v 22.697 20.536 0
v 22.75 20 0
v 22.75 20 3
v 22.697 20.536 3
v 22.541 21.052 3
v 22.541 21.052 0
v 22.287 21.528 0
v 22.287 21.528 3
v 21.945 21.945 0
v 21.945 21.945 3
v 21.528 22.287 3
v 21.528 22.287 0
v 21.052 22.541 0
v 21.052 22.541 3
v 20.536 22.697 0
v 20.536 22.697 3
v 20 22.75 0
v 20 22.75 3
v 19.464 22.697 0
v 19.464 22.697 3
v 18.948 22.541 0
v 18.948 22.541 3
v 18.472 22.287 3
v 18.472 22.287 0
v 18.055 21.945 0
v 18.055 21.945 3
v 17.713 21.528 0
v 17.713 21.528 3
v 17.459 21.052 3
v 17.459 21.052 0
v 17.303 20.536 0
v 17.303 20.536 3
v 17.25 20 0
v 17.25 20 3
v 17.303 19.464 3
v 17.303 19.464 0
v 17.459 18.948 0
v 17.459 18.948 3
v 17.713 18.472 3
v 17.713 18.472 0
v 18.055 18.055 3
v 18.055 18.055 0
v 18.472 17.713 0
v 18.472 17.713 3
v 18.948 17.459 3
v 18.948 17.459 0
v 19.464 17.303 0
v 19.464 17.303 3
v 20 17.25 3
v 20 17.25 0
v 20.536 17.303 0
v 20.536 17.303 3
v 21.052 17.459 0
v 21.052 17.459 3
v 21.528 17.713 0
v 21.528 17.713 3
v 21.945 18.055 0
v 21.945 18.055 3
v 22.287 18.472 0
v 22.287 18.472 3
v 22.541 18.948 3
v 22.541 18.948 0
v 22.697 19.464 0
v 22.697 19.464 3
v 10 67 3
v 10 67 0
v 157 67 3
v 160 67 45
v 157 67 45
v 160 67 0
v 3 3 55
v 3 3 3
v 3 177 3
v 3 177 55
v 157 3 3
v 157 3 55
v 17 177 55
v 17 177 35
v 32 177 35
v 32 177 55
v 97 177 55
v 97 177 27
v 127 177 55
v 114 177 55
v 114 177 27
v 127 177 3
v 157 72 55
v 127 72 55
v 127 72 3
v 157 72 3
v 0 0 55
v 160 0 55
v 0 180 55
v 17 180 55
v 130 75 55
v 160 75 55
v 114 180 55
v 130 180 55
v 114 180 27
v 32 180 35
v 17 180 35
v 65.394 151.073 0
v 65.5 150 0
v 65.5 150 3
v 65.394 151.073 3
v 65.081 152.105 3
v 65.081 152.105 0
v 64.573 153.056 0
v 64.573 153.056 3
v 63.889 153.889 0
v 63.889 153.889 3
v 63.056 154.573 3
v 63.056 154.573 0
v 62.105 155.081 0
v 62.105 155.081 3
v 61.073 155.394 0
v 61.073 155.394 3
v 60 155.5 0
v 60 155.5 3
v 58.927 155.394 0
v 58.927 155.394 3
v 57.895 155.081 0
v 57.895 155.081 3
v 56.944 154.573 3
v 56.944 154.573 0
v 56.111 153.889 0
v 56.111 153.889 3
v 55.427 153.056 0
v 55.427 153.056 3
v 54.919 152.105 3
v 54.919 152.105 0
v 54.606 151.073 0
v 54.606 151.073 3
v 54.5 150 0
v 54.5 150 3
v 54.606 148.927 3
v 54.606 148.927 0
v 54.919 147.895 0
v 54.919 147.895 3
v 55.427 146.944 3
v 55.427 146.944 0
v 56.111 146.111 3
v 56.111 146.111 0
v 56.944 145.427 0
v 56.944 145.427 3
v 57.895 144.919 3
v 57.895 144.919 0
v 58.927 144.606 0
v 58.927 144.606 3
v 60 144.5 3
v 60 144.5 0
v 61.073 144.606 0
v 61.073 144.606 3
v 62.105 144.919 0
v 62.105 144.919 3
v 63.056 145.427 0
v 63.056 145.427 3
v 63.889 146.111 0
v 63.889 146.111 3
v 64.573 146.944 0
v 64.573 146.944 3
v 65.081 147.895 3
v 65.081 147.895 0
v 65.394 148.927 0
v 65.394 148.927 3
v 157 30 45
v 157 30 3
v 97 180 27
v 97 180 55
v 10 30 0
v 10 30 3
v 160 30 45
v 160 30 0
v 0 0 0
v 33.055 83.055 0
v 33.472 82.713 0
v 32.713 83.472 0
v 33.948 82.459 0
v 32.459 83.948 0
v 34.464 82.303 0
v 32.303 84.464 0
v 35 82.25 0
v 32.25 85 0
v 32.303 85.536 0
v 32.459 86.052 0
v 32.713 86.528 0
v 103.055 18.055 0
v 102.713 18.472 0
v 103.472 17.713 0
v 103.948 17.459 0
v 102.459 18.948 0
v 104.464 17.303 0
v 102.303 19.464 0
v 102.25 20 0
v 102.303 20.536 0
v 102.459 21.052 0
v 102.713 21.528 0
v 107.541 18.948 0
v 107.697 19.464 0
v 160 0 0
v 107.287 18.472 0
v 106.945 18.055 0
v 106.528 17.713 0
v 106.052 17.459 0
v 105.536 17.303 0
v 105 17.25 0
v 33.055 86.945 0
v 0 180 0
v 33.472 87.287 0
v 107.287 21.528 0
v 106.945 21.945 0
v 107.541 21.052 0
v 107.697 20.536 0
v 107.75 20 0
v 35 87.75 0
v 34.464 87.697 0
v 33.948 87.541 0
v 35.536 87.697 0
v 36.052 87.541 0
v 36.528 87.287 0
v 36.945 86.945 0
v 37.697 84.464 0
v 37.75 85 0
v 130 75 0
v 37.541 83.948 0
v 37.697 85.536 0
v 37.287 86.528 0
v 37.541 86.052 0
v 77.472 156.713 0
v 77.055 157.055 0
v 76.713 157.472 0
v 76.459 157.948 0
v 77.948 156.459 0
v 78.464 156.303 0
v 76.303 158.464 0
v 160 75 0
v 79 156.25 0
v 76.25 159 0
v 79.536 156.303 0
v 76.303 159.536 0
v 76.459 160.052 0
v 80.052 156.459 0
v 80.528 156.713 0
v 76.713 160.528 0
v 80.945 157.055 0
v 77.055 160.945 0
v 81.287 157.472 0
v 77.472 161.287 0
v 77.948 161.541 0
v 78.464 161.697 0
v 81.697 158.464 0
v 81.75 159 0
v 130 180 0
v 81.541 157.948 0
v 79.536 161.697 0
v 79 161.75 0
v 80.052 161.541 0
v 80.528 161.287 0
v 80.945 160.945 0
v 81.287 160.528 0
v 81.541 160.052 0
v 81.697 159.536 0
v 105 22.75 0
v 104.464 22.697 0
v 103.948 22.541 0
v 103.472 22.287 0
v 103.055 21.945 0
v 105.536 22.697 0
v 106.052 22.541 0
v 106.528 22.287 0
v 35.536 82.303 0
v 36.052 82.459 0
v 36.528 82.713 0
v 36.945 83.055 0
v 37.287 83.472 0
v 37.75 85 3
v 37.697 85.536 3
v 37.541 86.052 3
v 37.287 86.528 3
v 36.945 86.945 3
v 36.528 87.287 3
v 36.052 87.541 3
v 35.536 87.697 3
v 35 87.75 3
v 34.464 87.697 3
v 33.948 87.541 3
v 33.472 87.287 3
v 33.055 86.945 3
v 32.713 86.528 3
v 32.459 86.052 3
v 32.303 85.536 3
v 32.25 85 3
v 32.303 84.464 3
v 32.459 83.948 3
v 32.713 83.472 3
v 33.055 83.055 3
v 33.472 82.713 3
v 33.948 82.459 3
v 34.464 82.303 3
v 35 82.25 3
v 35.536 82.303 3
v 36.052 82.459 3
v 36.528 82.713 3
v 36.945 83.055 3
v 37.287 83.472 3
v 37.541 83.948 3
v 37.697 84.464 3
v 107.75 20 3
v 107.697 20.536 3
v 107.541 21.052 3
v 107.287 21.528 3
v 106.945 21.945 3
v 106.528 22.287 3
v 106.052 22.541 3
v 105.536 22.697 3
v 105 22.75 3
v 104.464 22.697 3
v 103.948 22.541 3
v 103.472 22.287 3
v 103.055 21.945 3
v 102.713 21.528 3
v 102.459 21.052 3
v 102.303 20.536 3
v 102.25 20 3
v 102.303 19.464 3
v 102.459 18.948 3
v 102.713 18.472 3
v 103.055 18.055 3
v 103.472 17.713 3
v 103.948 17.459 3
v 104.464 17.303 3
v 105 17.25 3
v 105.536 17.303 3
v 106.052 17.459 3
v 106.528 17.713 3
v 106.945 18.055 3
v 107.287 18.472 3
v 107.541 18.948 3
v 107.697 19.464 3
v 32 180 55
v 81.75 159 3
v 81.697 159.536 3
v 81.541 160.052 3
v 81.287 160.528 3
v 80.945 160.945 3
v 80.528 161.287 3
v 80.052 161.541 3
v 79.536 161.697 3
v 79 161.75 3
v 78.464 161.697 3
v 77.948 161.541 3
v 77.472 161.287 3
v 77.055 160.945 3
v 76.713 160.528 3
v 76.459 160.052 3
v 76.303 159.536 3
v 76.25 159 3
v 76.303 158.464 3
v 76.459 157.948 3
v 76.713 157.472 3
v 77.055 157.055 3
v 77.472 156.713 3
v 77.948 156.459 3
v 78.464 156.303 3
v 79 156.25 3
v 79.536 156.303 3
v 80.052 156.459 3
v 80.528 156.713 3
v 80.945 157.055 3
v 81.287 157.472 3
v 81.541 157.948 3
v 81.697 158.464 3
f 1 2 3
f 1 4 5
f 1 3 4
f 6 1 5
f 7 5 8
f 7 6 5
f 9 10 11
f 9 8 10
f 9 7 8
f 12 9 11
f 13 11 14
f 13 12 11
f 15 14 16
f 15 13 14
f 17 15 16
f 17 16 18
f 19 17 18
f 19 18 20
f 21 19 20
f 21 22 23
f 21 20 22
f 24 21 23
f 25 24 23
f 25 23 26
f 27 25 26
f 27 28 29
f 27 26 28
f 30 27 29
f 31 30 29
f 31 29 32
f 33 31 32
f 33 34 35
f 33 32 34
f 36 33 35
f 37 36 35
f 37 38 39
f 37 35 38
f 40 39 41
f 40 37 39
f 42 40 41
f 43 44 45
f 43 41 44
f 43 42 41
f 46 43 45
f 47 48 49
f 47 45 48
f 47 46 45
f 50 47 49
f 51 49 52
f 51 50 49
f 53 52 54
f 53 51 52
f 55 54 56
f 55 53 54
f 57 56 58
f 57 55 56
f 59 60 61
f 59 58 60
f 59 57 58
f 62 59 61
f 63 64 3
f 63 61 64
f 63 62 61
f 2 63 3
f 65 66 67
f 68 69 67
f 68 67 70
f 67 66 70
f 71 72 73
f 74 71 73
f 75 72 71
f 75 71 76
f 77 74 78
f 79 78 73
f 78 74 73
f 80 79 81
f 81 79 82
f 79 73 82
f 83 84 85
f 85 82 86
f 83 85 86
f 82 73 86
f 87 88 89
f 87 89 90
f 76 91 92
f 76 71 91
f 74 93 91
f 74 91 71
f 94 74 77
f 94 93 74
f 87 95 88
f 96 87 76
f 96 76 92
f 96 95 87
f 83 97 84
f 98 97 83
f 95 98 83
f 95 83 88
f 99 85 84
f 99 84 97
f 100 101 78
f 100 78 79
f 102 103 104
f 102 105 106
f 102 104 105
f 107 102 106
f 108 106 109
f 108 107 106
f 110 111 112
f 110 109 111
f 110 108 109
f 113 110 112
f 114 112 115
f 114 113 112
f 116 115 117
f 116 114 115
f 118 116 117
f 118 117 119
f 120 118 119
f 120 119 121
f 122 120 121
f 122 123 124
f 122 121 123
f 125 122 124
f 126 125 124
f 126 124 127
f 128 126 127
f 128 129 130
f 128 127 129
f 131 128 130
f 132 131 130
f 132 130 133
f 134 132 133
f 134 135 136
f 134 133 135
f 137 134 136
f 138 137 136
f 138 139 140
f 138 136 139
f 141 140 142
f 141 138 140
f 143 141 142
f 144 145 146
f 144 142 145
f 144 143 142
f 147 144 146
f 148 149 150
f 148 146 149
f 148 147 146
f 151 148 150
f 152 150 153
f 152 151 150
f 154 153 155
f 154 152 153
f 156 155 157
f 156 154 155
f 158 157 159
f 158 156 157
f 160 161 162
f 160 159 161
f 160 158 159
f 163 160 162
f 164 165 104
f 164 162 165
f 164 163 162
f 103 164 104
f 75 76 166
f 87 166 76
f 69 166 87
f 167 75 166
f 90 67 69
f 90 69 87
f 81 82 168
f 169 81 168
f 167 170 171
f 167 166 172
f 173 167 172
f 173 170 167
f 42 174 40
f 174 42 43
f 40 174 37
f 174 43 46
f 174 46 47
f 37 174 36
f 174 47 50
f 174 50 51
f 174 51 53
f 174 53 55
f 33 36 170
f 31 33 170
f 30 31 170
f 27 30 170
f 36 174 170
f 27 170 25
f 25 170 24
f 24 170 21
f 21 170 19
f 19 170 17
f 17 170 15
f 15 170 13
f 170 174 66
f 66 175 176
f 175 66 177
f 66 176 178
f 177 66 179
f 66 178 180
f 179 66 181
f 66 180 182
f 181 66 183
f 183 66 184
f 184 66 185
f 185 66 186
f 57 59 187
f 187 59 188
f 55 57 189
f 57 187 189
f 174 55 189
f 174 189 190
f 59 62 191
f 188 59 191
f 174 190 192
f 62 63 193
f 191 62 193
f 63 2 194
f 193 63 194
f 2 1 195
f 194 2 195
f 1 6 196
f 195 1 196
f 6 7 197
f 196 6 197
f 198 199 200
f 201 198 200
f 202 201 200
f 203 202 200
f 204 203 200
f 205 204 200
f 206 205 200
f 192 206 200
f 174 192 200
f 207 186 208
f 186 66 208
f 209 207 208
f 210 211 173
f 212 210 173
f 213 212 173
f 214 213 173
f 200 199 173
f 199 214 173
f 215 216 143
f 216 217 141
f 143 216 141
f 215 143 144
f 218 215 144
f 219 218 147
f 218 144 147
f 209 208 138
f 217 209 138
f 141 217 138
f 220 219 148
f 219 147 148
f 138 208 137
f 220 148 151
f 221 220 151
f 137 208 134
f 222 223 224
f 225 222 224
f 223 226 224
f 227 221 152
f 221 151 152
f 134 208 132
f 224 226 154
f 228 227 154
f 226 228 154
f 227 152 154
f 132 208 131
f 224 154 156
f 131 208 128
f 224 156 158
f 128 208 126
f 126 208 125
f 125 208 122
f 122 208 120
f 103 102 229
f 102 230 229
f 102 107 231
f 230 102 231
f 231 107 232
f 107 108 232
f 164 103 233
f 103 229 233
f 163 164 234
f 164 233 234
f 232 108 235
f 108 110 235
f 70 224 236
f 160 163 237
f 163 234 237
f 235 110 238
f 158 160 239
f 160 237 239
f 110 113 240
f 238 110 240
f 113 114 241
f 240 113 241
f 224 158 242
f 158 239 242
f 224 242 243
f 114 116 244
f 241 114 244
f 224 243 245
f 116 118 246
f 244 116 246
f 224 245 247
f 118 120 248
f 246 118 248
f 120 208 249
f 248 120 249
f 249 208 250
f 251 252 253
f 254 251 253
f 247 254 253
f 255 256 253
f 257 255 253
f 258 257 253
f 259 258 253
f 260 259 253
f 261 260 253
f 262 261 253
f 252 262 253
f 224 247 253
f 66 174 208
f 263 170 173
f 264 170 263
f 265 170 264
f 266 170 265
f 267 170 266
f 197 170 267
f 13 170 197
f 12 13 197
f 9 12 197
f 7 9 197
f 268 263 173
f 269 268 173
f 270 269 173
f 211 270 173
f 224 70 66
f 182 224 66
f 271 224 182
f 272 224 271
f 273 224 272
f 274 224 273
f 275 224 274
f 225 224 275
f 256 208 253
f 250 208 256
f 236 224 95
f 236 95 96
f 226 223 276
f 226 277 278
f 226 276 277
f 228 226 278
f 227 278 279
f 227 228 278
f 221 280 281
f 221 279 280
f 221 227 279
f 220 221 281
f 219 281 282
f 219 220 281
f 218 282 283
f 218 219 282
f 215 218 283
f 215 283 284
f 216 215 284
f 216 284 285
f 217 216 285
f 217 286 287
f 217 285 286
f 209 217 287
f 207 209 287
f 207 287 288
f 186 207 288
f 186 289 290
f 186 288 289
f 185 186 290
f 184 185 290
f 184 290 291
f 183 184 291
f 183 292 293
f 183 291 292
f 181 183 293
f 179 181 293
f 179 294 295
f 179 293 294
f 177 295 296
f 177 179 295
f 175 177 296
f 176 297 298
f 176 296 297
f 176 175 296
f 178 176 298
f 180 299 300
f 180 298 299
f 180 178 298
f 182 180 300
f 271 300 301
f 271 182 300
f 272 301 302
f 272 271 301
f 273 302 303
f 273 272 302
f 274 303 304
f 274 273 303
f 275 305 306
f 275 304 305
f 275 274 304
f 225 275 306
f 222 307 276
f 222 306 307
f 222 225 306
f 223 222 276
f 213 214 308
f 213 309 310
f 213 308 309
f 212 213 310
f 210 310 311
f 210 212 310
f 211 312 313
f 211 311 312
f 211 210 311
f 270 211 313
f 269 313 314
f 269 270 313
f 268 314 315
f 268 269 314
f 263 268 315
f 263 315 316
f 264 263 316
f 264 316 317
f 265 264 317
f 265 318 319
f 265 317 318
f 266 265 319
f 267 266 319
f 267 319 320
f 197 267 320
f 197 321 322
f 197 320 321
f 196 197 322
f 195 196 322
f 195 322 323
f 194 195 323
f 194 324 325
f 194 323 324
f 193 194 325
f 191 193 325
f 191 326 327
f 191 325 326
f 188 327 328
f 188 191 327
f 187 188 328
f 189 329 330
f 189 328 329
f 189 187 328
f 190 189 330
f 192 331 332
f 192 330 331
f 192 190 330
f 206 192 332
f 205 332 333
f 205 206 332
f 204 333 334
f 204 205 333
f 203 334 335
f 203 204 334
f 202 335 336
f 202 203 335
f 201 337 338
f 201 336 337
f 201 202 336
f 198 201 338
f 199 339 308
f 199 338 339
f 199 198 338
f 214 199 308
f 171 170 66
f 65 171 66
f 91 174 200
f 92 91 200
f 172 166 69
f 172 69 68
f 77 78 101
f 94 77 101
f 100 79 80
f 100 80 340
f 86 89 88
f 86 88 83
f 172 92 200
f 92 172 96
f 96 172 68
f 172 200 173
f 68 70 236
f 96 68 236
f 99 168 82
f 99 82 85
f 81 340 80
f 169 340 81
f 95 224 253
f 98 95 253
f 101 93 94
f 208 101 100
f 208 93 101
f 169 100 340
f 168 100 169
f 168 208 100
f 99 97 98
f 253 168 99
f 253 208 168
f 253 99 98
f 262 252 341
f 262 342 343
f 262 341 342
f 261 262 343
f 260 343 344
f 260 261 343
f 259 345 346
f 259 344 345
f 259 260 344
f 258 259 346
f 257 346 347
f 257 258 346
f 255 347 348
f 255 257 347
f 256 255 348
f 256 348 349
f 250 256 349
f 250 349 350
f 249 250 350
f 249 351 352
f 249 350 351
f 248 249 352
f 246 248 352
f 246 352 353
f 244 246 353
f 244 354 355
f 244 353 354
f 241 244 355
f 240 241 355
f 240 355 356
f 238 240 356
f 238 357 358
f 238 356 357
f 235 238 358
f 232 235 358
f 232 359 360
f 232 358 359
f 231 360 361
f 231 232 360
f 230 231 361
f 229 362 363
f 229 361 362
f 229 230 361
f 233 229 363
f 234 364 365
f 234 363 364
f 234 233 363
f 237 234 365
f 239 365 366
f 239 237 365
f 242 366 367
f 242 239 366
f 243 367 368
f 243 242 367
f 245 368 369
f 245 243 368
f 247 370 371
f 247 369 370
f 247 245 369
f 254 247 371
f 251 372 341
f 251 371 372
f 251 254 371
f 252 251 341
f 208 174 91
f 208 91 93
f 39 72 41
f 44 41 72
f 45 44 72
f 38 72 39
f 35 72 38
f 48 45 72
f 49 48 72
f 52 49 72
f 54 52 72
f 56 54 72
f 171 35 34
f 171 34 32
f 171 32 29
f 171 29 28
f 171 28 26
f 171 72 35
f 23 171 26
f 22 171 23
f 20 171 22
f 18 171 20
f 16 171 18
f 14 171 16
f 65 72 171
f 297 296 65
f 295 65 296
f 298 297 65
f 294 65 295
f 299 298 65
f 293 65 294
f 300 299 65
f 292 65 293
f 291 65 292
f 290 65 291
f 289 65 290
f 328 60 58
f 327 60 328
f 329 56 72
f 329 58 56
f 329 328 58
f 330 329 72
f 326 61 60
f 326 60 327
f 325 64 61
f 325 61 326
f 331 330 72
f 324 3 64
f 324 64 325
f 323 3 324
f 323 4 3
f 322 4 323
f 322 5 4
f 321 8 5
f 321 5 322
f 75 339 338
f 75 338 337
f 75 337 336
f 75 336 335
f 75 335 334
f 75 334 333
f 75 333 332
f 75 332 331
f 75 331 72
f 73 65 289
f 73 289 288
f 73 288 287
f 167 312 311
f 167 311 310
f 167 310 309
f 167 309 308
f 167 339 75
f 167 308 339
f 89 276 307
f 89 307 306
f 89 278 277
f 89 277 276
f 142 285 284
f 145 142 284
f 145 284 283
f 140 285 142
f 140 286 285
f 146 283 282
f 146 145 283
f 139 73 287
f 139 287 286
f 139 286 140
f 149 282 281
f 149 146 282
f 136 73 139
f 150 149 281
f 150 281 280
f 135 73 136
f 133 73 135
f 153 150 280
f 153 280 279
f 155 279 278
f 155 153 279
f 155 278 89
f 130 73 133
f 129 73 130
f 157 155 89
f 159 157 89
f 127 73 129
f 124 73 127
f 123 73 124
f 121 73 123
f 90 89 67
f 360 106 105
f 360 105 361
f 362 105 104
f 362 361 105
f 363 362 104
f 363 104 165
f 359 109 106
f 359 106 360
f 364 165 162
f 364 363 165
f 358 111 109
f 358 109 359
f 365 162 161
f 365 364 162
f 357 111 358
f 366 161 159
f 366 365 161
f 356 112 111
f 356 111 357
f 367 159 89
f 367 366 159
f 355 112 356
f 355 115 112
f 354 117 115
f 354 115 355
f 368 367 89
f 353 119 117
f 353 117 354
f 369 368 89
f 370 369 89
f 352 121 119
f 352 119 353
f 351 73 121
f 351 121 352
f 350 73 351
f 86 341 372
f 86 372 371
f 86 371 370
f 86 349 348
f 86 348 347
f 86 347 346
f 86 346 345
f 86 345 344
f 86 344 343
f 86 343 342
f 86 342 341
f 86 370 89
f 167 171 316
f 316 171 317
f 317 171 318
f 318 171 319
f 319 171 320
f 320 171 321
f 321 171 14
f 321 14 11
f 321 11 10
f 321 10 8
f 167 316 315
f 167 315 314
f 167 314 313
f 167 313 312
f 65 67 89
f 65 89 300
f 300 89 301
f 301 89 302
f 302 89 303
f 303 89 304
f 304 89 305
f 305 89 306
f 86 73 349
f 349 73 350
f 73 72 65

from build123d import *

# Parameters (mm, degrees)
BOX021_W          = 150
BOX021_H          = 37
BOX021_DEPTH      = 45
BOX018_W          = 15
BOX018_H          = 20
BOX018_DEPTH      = 20
BOX017_W          = 17
BOX017_H          = 20
BOX017_DEPTH      = 28
CYLINDER015_R     = 2.75
CYLINDER015_DEPTH = 10
CYLINDER016_R     = 2.75
CYLINDER016_DEPTH = 10
CYLINDER017_R     = 2.75
CYLINDER017_DEPTH = 10
CYLINDER018_R     = 5.5
CYLINDER018_DEPTH = 10
CYLINDER014_R     = 2.75
CYLINDER014_DEPTH = 10
BOX016_W          = 30
BOX016_H          = 69
BOX016_DEPTH      = 55
BOX015_W          = 124
BOX015_H          = 174
BOX015_DEPTH      = 55
BOX014_W          = 30
BOX014_H          = 105
BOX014_DEPTH      = 55
BOX009_W          = 160
BOX009_H          = 180
BOX009_DEPTH      = 55


with BuildPart() as w_rfel014:
    # Box021 → Box021 (new body)
    with BuildSketch(Plane(origin=(10, 30, 0), x_dir=(1, 0, 0), z_dir=(0, 0, 1))):
        with Locations((75, 18.5)):
            Rectangle(BOX021_W, BOX021_H)
    extrude(amount=BOX021_DEPTH)


with BuildPart() as w_rfel011:
    # Box018 → Box018 (new body)
    with BuildSketch(Plane(origin=(17, 170, 35), x_dir=(1, 0, 0), z_dir=(0, 0, 1))):
        with Locations((7.5, 10)):
            Rectangle(BOX018_W, BOX018_H)
    extrude(amount=BOX018_DEPTH)


with BuildPart() as fusion012:
    # Box017 → Box017 (new body)
    with BuildSketch(Plane(origin=(97, 170, 27), x_dir=(1, 0, 0), z_dir=(0, 0, 1))):
        with Locations((8.5, 10)):
            Rectangle(BOX017_W, BOX017_H)
    extrude(amount=BOX017_DEPTH)

    # Fusion012: union Würfel011
    add(w_rfel011.part)


with BuildPart() as zylinder001:
    # Cylinder015 → Cylinder015 (new body)
    with BuildSketch(Plane(origin=(105, 20, -3), x_dir=(1, 0, 0), z_dir=(0, 0, 1))):
        Circle(CYLINDER015_R)
    extrude(amount=CYLINDER015_DEPTH)


with BuildPart() as zylinder002:
    # Cylinder016 → Cylinder016 (new body)
    with BuildSketch(Plane(origin=(79, 159, -3), x_dir=(1, 0, 0), z_dir=(0, 0, 1))):
        Circle(CYLINDER016_R)
    extrude(amount=CYLINDER016_DEPTH)


with BuildPart() as zylinder003:
    # Cylinder017 → Cylinder017 (new body)
    with BuildSketch(Plane(origin=(35, 85, -3), x_dir=(1, 0, 0), z_dir=(0, 0, 1))):
        Circle(CYLINDER017_R)
    extrude(amount=CYLINDER017_DEPTH)


with BuildPart() as zylinder004:
    # Cylinder018 → Cylinder018 (new body)
    with BuildSketch(Plane(origin=(60, 150, -3), x_dir=(1, 0, 0), z_dir=(0, 0, 1))):
        Circle(CYLINDER018_R)
    extrude(amount=CYLINDER018_DEPTH)


with BuildPart() as fusion008:
    # Cylinder014 → Cylinder014 (new body)
    with BuildSketch(Plane(origin=(20, 20, -3), x_dir=(1, 0, 0), z_dir=(0, 0, 1))):
        Circle(CYLINDER014_R)
    extrude(amount=CYLINDER014_DEPTH)

    # Fusion008: union Zylinder001, Zylinder002, Zylinder003, Zylinder004
    add(zylinder001.part)
    add(zylinder002.part)
    add(zylinder003.part)
    add(zylinder004.part)


with BuildPart() as w_rfel009:
    # Box016 → Box016 (new body)
    with BuildSketch(Plane(origin=(127, 3, 3), x_dir=(1, 0, 0), z_dir=(0, 0, 1))):
        with Locations((15, 34.5)):
            Rectangle(BOX016_W, BOX016_H)
    extrude(amount=BOX016_DEPTH)


with BuildPart() as fusion011:
    # Box015 → Box015 (new body)
    with BuildSketch(Plane(origin=(3, 3, 3), x_dir=(1, 0, 0), z_dir=(0, 0, 1))):
        with Locations((62, 87)):
            Rectangle(BOX015_W, BOX015_H)
    extrude(amount=BOX015_DEPTH)

    # Fusion011: union Würfel009
    add(w_rfel009.part)


with BuildPart() as w_rfel007:
    # Box014 → Box014 (new body)
    with BuildSketch(Plane(origin=(130, 75, 0), x_dir=(1, 0, 0), z_dir=(0, 0, 1))):
        with Locations((15, 52.5)):
            Rectangle(BOX014_W, BOX014_H)
    extrude(amount=BOX014_DEPTH)


with BuildPart() as cut017:
    # Box009 → Box009 (new body)
    with BuildSketch(Plane.XY):
        with Locations((80, 90)):
            Rectangle(BOX009_W, BOX009_H)
    extrude(amount=BOX009_DEPTH)

    # Cut012: cut Würfel007
    add(w_rfel007.part, mode=Mode.SUBTRACT)

    # Cut013: cut Fusion011
    add(fusion011.part, mode=Mode.SUBTRACT)

    # Cut014: cut Fusion008
    add(fusion008.part, mode=Mode.SUBTRACT)

    # Cut015: cut Fusion012
    add(fusion012.part, mode=Mode.SUBTRACT)

    # Cut017: cut Würfel014
    add(w_rfel014.part, mode=Mode.SUBTRACT)


solid = cut017.part
